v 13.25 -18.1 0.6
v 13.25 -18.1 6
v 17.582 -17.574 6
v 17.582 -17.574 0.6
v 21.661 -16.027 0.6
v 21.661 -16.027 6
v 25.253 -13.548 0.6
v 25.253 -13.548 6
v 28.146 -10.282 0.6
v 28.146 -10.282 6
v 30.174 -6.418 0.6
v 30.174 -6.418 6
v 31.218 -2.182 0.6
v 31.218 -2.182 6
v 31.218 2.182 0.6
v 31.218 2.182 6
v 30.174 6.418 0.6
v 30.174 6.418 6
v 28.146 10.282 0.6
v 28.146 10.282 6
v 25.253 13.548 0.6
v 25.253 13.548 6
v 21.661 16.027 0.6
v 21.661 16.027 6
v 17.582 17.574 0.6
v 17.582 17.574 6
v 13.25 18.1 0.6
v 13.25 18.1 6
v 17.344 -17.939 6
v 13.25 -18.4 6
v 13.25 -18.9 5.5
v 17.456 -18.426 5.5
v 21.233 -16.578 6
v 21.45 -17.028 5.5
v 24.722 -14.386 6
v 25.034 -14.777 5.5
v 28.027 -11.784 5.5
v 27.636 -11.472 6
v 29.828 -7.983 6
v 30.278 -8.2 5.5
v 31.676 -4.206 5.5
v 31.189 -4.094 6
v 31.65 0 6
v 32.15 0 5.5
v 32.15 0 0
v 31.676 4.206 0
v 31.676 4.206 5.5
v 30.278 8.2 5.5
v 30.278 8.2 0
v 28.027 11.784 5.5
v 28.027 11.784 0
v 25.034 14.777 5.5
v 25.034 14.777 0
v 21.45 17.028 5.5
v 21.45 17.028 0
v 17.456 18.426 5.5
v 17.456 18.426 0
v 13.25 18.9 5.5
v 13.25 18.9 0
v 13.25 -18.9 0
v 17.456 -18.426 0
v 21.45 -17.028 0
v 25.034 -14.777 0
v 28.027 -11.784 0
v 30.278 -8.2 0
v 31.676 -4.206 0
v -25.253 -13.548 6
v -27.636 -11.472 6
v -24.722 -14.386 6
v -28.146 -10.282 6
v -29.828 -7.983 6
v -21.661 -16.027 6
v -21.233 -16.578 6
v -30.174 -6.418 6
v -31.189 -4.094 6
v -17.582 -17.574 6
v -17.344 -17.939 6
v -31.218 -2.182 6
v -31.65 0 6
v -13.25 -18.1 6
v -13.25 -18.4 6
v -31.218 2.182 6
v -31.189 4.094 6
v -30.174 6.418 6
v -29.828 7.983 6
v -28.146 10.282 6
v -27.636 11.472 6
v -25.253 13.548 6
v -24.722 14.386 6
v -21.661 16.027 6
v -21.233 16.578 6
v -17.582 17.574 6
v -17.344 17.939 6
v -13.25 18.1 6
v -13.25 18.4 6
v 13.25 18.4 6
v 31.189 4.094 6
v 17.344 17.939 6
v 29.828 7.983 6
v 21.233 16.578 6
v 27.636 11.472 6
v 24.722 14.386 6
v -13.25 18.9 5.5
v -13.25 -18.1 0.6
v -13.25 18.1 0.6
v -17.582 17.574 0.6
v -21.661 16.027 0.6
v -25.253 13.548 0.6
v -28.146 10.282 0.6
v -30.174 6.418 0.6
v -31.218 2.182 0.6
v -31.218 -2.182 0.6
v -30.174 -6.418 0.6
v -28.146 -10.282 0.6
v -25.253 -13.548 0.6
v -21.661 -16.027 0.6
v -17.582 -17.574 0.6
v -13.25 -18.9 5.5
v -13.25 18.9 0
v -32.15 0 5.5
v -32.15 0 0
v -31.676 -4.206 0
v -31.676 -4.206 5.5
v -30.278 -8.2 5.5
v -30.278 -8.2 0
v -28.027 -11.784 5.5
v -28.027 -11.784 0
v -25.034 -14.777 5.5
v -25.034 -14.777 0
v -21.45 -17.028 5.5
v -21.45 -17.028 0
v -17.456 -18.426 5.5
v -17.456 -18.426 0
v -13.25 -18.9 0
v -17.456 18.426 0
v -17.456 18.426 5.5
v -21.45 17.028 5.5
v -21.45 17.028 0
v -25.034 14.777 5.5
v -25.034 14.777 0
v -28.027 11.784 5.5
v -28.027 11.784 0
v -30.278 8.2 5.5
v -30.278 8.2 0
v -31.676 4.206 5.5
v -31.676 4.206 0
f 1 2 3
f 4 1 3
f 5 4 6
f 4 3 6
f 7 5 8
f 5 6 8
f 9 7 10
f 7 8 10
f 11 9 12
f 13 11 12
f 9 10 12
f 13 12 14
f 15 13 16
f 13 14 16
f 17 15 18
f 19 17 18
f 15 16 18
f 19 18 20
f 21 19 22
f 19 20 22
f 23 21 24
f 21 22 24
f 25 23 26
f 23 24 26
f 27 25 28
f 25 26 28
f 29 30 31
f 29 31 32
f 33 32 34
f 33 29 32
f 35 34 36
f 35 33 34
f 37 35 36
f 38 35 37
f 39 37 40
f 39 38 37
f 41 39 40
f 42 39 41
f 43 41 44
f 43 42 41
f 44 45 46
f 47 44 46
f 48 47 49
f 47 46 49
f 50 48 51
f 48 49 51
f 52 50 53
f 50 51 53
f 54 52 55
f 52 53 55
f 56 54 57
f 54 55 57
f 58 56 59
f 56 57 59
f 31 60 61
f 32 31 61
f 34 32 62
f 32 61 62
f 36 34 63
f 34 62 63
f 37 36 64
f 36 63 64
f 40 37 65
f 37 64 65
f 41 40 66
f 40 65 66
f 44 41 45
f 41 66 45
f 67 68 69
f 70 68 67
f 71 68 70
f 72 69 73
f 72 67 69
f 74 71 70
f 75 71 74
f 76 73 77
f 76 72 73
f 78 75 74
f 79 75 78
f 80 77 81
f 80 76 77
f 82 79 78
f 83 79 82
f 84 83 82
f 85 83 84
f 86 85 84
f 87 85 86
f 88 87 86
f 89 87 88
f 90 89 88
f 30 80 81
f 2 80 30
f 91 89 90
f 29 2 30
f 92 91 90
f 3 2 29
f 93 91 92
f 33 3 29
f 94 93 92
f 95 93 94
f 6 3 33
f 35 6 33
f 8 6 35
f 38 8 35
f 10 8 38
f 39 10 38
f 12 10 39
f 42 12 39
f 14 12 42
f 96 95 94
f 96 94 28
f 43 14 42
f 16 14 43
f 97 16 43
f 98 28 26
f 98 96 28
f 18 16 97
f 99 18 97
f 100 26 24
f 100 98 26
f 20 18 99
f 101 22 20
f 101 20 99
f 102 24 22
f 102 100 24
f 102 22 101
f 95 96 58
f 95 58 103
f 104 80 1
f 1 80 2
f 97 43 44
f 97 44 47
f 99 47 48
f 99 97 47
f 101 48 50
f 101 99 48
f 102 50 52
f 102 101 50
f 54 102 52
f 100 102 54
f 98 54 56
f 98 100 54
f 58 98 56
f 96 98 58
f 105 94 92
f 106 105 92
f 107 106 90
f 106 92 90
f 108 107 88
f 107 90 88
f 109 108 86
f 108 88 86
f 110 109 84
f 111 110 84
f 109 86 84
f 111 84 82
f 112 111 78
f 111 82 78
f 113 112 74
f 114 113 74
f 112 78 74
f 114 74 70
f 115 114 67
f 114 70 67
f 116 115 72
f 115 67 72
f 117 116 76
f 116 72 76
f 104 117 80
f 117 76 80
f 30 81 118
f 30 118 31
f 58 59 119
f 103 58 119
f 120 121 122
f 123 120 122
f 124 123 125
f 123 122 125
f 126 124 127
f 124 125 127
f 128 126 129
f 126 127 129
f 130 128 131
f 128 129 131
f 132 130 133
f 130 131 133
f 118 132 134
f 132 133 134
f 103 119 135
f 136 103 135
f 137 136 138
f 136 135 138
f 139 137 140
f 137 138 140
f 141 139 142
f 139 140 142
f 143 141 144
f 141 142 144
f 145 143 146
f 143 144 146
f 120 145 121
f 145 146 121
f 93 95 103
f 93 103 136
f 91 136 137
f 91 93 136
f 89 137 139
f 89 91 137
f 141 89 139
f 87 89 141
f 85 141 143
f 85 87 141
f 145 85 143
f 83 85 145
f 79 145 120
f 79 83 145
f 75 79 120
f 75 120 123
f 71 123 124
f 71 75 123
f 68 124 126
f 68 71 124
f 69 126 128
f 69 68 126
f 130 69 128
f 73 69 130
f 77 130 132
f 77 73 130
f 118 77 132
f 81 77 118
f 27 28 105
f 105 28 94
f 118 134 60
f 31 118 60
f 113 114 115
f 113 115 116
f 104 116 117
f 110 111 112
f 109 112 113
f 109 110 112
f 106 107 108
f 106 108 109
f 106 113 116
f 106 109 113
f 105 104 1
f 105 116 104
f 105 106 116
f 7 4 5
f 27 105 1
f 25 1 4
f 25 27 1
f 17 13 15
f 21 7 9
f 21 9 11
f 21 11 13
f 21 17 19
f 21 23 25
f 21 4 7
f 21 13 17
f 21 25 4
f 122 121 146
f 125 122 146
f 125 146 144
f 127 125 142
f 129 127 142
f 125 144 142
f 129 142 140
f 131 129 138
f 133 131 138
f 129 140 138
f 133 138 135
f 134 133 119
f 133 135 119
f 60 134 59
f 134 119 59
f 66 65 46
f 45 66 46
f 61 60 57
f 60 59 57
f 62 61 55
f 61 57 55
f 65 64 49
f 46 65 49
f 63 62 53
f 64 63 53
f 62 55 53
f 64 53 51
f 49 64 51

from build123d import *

# Parameters (mm, degrees)
F1_DEPTH = 6
F3_DEPTH = 5.4
F4_SIZE  = 0.5


with BuildPart() as f1:
    # F0 (on Top) → F1 (new body)
    with BuildSketch(Plane.XY):
        with BuildLine():
            Line((13.25, 18.9), (-13.25, 18.9))
            ThreePointArc((-13.25, 18.9), (-26.6143181644, 13.3643181644), (-32.15, 0))
            ThreePointArc((-32.15, 0), (-26.6143181644, -13.3643181644), (-13.25, -18.9))
            Line((-13.25, -18.9), (13.25, -18.9))
            ThreePointArc((13.25, -18.9), (26.6143181644, -13.3643181644), (32.15, 0))
            ThreePointArc((32.15, 0), (26.6143181644, 13.3643181644), (13.25, 18.9))
        make_face()
    extrude(amount=F1_DEPTH)

    # F2 (on face) → F3 (cut)
    with BuildSketch(Plane.XY.offset(6)):
        with BuildLine():
            Line((13.25, 18.1), (-13.25, 18.1))
            ThreePointArc((-13.25, 18.1), (-31.35, 0), (-13.25, -18.1))
            Line((-13.25, -18.1), (13.25, -18.1))
            ThreePointArc((13.25, -18.1), (31.35, 0), (13.25, 18.1))
        make_face()
    extrude(amount=-F3_DEPTH, mode=Mode.SUBTRACT)

    # F4
    f4_edges = [f1.edges().sort_by_distance(p)[0] for p in [
        (-32.15, 0, 6),
        (32.15, 0, 6),
        (0, 18.9, 6),
        (0, -18.9, 6),
    ]]
    chamfer(f4_edges, length=F4_SIZE)


solid = f1.part
